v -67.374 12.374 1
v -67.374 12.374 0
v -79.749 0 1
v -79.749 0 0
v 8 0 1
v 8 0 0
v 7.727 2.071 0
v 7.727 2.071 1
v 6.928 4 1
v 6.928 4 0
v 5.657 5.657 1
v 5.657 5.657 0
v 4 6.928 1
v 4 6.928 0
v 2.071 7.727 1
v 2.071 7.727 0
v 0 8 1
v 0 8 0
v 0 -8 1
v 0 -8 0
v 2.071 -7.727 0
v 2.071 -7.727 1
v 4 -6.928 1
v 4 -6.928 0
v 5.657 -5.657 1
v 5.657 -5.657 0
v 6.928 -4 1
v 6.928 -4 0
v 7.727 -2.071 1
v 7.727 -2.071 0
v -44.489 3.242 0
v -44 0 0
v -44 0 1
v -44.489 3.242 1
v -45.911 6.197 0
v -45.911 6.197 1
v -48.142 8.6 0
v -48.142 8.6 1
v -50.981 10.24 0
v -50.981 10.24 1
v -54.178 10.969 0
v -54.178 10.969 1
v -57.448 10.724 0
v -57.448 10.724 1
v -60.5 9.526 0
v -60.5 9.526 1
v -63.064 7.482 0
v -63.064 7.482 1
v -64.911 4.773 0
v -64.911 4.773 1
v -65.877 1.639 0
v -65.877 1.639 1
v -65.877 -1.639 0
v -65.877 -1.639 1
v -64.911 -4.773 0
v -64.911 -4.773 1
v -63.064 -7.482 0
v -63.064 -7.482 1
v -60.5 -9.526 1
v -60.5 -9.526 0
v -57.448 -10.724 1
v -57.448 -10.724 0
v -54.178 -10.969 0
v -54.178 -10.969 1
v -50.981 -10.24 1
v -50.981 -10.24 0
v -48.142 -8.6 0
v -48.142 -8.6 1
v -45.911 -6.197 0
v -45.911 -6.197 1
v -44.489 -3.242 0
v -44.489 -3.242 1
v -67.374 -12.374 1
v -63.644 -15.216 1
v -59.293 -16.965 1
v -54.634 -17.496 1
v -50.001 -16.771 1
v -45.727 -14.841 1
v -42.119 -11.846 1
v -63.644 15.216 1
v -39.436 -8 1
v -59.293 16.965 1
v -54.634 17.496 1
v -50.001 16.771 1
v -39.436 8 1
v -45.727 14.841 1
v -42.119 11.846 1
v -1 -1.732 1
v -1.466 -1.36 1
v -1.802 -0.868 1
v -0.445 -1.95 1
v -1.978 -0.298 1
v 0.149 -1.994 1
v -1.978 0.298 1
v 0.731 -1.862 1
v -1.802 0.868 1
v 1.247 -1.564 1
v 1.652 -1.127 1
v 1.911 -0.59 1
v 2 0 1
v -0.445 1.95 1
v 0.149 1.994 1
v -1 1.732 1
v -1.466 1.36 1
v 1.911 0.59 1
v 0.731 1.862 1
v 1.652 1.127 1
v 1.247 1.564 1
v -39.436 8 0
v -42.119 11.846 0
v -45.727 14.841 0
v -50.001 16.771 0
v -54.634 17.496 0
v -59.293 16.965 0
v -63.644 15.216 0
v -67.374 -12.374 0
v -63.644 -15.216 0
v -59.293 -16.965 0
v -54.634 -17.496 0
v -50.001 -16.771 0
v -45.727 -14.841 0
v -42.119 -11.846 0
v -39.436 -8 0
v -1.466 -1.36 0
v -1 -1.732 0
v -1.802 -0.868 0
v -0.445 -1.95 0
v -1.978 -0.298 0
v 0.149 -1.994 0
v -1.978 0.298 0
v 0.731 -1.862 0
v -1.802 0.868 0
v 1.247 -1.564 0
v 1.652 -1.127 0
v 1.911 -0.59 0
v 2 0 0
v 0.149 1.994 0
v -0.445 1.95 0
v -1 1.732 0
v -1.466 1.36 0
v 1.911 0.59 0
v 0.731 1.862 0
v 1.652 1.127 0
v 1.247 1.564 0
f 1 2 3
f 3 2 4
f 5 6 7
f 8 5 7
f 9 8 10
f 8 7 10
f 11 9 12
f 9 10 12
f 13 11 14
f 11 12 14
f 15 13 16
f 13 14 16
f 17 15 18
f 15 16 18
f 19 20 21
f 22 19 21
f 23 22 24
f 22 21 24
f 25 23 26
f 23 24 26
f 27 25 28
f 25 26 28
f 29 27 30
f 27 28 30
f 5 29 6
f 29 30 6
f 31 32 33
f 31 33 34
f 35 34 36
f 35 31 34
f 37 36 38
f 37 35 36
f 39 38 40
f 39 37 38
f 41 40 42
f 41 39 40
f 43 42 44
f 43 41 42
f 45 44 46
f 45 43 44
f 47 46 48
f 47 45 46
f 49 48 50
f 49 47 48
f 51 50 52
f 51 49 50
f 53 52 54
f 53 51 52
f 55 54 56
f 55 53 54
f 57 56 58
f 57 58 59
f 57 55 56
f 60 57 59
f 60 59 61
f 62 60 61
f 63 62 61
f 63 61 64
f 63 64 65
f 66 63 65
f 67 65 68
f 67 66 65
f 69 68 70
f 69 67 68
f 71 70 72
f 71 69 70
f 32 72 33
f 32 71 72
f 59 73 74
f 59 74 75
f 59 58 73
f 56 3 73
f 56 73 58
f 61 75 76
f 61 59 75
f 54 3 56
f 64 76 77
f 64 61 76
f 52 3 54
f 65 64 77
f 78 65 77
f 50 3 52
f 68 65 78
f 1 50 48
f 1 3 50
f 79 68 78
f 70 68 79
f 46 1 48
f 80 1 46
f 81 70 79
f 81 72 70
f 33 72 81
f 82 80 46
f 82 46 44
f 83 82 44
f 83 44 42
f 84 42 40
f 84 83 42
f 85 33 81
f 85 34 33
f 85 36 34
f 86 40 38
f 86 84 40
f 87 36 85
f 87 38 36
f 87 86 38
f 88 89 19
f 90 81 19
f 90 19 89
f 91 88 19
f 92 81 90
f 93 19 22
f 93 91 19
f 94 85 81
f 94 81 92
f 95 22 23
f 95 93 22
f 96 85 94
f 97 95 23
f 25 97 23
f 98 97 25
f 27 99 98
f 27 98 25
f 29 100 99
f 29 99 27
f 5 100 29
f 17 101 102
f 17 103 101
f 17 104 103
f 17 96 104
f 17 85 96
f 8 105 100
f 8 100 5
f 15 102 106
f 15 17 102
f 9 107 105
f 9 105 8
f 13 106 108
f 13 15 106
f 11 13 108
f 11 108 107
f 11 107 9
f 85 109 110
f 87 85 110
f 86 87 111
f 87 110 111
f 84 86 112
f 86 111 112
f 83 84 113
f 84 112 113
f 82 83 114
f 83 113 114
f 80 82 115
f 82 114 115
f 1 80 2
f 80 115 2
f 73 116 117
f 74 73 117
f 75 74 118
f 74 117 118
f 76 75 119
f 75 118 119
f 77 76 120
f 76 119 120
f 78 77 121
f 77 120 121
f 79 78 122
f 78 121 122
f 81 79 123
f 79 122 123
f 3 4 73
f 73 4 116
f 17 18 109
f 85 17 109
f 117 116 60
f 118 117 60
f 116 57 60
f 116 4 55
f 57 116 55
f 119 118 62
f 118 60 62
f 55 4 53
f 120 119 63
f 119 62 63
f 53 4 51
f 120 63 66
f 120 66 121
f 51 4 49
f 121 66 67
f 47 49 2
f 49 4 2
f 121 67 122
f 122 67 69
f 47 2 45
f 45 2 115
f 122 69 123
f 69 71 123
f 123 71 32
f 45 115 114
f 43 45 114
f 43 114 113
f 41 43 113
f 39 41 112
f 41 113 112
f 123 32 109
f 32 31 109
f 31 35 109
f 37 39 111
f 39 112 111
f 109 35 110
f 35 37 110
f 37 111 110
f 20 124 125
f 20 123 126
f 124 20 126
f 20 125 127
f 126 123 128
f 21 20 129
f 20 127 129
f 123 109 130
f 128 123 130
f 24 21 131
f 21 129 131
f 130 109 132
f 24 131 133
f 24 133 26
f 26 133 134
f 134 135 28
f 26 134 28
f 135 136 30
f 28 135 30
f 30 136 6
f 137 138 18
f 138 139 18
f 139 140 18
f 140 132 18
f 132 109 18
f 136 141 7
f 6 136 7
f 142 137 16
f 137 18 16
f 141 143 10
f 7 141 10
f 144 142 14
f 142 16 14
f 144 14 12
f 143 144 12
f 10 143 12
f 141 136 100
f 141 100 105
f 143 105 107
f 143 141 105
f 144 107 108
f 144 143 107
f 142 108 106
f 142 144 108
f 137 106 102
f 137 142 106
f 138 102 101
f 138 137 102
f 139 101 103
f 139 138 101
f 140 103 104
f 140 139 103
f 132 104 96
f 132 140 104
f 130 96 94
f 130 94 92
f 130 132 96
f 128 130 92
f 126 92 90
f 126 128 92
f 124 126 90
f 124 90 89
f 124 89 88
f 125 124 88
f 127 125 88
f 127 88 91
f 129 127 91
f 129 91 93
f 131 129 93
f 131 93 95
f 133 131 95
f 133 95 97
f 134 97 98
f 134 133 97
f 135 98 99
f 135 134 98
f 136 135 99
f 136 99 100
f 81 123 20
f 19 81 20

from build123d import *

# Parameters (mm, degrees)
F0_R     = 11
F0_R_2   = 2
F1_DEPTH = 1


with BuildPart() as f1:
    # F0 (on Top) → F1 (new body)
    with BuildSketch(Plane.XY):
        with BuildLine():
            ThreePointArc((-37.5, 0), (-37.990786, 4.115417), (-39.435618, 8))
            ThreePointArc((-39.435618, 8), (-52.293005, 17.289366), (-67.374369, 12.374369))
            ThreePointArc((-67.374369, 12.374369), (-72.5, 0), (-67.374369, -12.374369))
            ThreePointArc((-67.374369, -12.374369), (-52.293005, -17.289366), (-39.435618, -8))
            ThreePointArc((-39.435618, -8), (-37.990786, -4.115417), (-37.5, 0))
        make_face()
        with Locations((-55, 0)):
            Circle(F0_R, mode=Mode.SUBTRACT)
        with BuildLine():
            ThreePointArc((-67.374369, -12.374369), (-72.5, 0), (-67.374369, 12.374369))
            Line((-67.374369, 12.374369), (-79.748737, 0))
            Line((-79.748737, 0), (-67.374369, -12.374369))
        make_face()
        with BuildLine():
            ThreePointArc((0, -8), (-8, 0), (0, 8))
            Line((0, 8), (-39.435618, 8))
            ThreePointArc((-39.435618, 8), (-37.990786, 4.115417), (-37.5, 0))
            ThreePointArc((-37.5, 0), (-37.990786, -4.115417), (-39.435618, -8))
            Line((-39.435618, -8), (0, -8))
        make_face()
        with BuildLine():
            ThreePointArc((0, -8), (5.656854, -5.656854), (8, 0))
            ThreePointArc((8, 0), (5.656854, 5.656854), (0, 8))
            ThreePointArc((0, 8), (-8, 0), (0, -8))
        make_face()
        Circle(F0_R_2, mode=Mode.SUBTRACT)
    extrude(amount=F1_DEPTH)


solid = f1.part
